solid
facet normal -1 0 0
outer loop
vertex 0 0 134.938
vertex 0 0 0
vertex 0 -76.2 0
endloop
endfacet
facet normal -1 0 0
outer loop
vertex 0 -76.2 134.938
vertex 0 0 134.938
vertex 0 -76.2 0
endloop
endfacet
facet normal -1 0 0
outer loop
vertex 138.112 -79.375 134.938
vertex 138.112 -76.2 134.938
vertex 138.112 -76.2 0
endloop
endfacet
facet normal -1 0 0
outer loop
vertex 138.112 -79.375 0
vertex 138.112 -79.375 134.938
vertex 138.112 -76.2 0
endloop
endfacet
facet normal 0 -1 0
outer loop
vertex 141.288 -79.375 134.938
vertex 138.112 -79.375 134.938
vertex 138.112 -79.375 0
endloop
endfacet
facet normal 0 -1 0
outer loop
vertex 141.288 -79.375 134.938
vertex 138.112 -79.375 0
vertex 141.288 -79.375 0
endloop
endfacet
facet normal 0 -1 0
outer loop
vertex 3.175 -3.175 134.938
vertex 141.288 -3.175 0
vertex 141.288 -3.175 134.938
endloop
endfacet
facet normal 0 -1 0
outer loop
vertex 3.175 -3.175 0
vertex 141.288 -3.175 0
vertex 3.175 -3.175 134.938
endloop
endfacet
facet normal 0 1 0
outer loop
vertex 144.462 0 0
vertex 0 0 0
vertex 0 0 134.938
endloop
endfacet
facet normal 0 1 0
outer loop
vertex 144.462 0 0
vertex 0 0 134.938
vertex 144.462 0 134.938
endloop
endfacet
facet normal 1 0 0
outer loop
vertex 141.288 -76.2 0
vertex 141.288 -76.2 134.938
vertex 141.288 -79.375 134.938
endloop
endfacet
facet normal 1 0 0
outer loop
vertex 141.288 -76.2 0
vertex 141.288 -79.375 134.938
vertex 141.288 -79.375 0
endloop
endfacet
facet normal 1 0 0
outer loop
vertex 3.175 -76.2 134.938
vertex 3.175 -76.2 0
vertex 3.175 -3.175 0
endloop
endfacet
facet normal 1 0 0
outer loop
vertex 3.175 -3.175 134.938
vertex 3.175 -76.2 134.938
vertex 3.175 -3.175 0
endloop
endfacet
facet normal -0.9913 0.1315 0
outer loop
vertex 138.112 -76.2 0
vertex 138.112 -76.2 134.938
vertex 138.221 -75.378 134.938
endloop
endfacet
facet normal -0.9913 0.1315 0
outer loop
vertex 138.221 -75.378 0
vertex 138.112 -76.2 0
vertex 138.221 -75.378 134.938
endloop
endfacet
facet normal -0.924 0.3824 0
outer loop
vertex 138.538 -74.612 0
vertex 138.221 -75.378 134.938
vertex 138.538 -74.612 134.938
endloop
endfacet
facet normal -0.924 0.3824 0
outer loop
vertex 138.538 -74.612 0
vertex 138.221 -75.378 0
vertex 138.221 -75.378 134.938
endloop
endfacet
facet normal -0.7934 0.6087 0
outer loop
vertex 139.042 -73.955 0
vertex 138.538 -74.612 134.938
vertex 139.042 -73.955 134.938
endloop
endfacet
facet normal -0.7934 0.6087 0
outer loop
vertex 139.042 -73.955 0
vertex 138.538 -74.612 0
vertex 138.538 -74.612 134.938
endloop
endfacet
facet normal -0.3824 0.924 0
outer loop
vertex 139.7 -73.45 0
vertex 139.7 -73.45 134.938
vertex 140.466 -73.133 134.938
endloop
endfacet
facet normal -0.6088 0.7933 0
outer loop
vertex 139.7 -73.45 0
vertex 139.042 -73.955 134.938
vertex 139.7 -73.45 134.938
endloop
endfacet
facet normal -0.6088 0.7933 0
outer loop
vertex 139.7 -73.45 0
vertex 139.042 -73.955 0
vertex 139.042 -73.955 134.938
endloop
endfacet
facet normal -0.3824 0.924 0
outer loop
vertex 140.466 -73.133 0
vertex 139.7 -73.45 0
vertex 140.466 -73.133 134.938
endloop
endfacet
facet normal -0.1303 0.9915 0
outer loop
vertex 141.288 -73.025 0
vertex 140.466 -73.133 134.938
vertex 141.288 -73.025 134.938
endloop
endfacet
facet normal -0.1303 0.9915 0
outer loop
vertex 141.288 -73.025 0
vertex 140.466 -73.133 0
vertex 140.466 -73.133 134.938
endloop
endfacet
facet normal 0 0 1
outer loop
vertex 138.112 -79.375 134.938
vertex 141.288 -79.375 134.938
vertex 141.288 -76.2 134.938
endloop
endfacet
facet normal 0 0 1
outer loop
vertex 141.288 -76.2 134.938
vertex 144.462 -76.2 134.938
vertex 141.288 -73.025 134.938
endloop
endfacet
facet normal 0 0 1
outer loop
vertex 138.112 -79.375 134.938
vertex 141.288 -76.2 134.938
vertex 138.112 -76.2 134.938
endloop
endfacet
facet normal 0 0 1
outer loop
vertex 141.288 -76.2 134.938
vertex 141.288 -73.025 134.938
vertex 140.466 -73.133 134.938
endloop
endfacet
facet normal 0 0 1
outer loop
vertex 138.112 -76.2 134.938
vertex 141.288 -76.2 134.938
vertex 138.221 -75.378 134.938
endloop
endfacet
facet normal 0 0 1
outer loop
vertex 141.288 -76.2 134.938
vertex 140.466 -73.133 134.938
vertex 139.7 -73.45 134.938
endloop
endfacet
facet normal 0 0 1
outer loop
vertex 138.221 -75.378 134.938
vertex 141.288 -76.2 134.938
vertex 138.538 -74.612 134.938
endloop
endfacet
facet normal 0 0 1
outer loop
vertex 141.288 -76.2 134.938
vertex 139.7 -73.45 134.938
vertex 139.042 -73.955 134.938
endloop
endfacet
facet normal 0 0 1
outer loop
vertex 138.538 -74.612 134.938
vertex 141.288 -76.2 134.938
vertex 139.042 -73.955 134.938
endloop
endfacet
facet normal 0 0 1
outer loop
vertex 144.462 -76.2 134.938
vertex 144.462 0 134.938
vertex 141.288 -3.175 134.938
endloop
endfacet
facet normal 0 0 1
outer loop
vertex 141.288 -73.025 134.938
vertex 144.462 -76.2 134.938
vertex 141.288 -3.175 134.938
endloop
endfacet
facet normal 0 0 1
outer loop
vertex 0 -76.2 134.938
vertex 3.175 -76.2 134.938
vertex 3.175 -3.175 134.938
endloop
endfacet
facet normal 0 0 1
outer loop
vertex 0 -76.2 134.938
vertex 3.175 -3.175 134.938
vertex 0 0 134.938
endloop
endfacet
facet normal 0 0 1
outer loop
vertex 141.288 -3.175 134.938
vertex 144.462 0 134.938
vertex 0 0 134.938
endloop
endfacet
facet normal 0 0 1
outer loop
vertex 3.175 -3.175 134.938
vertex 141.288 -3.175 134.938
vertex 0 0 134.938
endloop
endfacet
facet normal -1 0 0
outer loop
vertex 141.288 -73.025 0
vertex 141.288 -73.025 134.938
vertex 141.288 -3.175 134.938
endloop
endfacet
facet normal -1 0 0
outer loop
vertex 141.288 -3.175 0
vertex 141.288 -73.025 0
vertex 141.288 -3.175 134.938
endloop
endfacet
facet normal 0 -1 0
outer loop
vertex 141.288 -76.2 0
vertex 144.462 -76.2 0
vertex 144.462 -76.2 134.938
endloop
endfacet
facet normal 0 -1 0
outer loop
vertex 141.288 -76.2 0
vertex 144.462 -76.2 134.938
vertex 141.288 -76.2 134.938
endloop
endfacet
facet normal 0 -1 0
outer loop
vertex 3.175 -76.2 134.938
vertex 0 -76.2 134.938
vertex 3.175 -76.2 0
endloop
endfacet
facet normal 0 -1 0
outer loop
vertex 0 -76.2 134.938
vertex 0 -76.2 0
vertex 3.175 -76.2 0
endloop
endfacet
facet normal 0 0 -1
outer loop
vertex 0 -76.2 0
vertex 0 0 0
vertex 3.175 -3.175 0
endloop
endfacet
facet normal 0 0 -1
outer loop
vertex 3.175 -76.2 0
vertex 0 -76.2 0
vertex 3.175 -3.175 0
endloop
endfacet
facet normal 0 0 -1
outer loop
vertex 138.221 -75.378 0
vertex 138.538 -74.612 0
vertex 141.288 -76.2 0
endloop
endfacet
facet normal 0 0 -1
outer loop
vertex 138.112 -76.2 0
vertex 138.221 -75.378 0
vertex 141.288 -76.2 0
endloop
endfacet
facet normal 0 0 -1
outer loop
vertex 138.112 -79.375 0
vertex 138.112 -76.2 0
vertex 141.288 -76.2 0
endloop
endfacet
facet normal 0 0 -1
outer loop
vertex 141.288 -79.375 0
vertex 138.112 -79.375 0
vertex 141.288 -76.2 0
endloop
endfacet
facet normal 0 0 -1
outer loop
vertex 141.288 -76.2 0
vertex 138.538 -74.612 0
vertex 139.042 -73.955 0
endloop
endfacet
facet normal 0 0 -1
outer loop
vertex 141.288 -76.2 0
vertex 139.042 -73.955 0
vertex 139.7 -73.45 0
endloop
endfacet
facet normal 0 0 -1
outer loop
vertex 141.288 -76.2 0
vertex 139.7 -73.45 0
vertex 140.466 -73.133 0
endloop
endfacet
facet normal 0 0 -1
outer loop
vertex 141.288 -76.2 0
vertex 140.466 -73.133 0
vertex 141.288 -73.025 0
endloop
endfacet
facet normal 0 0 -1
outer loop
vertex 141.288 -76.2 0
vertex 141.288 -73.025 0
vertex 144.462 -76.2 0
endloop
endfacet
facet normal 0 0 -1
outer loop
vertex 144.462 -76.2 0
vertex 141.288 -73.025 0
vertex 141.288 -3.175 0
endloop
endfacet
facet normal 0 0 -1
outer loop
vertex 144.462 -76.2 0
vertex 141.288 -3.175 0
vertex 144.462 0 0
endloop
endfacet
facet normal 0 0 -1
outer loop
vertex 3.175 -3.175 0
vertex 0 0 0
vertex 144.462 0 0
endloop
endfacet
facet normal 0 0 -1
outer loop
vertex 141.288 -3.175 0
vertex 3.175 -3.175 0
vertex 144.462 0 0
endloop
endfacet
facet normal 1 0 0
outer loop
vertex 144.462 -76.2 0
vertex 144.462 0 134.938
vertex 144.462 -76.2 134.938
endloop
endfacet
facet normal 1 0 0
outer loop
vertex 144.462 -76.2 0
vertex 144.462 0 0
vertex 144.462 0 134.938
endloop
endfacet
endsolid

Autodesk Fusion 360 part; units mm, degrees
sketch "Sketch1" plane through (0, 0, 0) normal (0, 0, 1) x (1, 0, 0)
  line L0 (0, 0) -> (0, -76.2)
  line L1 (0, -76.2) -> (3.175, -76.2)
  line L2 (3.175, -76.2) -> (3.175, -3.175)
  line L3 (0, 0) -> (144.4625, 0)
  line L4 (144.4625, 0) -> (144.4625, -76.2)
  line L5 (144.4625, -76.2) -> (141.2875, -76.2)
  line L6 (141.2875, -76.2) -> (141.2875, -3.175)
  line L7 (141.2875, -3.175) -> (3.175, -3.175)
  dimension "d1" = 76.2
  dimension "d2" = 3.175
  dimension "d3" = 73.025
  dimension "d4" = 144.4625
  dimension "d5" = 76.2
  dimension "d6" = 3.175
  dimension "d7" = 73.025
extrude "Extrude1" add sketch "Sketch1" along normal blind 134.9375
sketch "Sketch2" plane through (141.2875, 0, 0) normal (-1, 0, 0) x (0, -1, 0)
  line L0 (3.175, 0) -> (76.2, 0)
  line L1 (76.2, 0) -> (76.2, 134.9375)
  line L2 (76.2, 134.9375) -> (3.175, 134.9375)
  line L3 (3.175, 134.9375) -> (3.175, 0)
  line L4 (76.2, 134.9375) -> (73.025, 134.9375)
  line L5 (73.025, 134.9375) -> (73.025, 0)
  line L6 (73.025, 0) -> (76.2, 0)
  line L7 (76.2, 0) -> (76.2, 134.9375)
  dimension "d11" = 3.175
revolve "Revolve1" add sketch "Sketch2" angle 90 about axis through (141.2875, -76.2, 0) along (0, 0, 1) contours L0 L1 L2 L4 L5 L6 L7
sketch "Sketch3" plane through (0, -76.2, 0) normal (0, -1, 0) x (1, 0, 0)
  line L0 (138.1125, 0) -> (144.4625, 0)
  line L1 (144.4625, 0) -> (144.4625, 134.9375)
  line L2 (144.4625, 134.9375) -> (138.1125, 134.9375)
  line L3 (138.1125, 134.9375) -> (138.1125, 0)
  line L4 (138.1125, 134.9375) -> (141.2875, 134.9375)
  line L5 (141.2875, 134.9375) -> (141.2875, 0)
  line L6 (141.2875, 0) -> (138.1125, 0)
  line L7 (138.1125, 0) -> (138.1125, 134.9375)
  dimension "d13" = 3.175
extrude "Extrude2" add sketch "Sketch3" along normal blind 3.175 contours L0 L2 L3 L4 L5 L6 L7
equation "Length = ( 10.625 / 2 ) * 1 in"
equation "d9 = Length"
